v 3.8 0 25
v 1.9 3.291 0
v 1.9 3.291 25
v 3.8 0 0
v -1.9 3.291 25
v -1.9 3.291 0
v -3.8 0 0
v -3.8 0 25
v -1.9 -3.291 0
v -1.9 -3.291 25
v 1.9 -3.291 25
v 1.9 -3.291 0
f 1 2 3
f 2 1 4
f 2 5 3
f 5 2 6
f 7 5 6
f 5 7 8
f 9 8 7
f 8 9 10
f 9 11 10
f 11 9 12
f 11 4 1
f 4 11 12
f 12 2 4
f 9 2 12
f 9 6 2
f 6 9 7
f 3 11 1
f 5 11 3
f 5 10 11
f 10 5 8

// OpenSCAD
//this is the standard hex bit driver


module hexbit(3dPrinterTolerance,bitradius,bitheight){
	cylinder($fn=6,r=bitradius+3dPrinterTolerance/2,h=bitheight);
}

hexbit(.4,7.2/2,25);
